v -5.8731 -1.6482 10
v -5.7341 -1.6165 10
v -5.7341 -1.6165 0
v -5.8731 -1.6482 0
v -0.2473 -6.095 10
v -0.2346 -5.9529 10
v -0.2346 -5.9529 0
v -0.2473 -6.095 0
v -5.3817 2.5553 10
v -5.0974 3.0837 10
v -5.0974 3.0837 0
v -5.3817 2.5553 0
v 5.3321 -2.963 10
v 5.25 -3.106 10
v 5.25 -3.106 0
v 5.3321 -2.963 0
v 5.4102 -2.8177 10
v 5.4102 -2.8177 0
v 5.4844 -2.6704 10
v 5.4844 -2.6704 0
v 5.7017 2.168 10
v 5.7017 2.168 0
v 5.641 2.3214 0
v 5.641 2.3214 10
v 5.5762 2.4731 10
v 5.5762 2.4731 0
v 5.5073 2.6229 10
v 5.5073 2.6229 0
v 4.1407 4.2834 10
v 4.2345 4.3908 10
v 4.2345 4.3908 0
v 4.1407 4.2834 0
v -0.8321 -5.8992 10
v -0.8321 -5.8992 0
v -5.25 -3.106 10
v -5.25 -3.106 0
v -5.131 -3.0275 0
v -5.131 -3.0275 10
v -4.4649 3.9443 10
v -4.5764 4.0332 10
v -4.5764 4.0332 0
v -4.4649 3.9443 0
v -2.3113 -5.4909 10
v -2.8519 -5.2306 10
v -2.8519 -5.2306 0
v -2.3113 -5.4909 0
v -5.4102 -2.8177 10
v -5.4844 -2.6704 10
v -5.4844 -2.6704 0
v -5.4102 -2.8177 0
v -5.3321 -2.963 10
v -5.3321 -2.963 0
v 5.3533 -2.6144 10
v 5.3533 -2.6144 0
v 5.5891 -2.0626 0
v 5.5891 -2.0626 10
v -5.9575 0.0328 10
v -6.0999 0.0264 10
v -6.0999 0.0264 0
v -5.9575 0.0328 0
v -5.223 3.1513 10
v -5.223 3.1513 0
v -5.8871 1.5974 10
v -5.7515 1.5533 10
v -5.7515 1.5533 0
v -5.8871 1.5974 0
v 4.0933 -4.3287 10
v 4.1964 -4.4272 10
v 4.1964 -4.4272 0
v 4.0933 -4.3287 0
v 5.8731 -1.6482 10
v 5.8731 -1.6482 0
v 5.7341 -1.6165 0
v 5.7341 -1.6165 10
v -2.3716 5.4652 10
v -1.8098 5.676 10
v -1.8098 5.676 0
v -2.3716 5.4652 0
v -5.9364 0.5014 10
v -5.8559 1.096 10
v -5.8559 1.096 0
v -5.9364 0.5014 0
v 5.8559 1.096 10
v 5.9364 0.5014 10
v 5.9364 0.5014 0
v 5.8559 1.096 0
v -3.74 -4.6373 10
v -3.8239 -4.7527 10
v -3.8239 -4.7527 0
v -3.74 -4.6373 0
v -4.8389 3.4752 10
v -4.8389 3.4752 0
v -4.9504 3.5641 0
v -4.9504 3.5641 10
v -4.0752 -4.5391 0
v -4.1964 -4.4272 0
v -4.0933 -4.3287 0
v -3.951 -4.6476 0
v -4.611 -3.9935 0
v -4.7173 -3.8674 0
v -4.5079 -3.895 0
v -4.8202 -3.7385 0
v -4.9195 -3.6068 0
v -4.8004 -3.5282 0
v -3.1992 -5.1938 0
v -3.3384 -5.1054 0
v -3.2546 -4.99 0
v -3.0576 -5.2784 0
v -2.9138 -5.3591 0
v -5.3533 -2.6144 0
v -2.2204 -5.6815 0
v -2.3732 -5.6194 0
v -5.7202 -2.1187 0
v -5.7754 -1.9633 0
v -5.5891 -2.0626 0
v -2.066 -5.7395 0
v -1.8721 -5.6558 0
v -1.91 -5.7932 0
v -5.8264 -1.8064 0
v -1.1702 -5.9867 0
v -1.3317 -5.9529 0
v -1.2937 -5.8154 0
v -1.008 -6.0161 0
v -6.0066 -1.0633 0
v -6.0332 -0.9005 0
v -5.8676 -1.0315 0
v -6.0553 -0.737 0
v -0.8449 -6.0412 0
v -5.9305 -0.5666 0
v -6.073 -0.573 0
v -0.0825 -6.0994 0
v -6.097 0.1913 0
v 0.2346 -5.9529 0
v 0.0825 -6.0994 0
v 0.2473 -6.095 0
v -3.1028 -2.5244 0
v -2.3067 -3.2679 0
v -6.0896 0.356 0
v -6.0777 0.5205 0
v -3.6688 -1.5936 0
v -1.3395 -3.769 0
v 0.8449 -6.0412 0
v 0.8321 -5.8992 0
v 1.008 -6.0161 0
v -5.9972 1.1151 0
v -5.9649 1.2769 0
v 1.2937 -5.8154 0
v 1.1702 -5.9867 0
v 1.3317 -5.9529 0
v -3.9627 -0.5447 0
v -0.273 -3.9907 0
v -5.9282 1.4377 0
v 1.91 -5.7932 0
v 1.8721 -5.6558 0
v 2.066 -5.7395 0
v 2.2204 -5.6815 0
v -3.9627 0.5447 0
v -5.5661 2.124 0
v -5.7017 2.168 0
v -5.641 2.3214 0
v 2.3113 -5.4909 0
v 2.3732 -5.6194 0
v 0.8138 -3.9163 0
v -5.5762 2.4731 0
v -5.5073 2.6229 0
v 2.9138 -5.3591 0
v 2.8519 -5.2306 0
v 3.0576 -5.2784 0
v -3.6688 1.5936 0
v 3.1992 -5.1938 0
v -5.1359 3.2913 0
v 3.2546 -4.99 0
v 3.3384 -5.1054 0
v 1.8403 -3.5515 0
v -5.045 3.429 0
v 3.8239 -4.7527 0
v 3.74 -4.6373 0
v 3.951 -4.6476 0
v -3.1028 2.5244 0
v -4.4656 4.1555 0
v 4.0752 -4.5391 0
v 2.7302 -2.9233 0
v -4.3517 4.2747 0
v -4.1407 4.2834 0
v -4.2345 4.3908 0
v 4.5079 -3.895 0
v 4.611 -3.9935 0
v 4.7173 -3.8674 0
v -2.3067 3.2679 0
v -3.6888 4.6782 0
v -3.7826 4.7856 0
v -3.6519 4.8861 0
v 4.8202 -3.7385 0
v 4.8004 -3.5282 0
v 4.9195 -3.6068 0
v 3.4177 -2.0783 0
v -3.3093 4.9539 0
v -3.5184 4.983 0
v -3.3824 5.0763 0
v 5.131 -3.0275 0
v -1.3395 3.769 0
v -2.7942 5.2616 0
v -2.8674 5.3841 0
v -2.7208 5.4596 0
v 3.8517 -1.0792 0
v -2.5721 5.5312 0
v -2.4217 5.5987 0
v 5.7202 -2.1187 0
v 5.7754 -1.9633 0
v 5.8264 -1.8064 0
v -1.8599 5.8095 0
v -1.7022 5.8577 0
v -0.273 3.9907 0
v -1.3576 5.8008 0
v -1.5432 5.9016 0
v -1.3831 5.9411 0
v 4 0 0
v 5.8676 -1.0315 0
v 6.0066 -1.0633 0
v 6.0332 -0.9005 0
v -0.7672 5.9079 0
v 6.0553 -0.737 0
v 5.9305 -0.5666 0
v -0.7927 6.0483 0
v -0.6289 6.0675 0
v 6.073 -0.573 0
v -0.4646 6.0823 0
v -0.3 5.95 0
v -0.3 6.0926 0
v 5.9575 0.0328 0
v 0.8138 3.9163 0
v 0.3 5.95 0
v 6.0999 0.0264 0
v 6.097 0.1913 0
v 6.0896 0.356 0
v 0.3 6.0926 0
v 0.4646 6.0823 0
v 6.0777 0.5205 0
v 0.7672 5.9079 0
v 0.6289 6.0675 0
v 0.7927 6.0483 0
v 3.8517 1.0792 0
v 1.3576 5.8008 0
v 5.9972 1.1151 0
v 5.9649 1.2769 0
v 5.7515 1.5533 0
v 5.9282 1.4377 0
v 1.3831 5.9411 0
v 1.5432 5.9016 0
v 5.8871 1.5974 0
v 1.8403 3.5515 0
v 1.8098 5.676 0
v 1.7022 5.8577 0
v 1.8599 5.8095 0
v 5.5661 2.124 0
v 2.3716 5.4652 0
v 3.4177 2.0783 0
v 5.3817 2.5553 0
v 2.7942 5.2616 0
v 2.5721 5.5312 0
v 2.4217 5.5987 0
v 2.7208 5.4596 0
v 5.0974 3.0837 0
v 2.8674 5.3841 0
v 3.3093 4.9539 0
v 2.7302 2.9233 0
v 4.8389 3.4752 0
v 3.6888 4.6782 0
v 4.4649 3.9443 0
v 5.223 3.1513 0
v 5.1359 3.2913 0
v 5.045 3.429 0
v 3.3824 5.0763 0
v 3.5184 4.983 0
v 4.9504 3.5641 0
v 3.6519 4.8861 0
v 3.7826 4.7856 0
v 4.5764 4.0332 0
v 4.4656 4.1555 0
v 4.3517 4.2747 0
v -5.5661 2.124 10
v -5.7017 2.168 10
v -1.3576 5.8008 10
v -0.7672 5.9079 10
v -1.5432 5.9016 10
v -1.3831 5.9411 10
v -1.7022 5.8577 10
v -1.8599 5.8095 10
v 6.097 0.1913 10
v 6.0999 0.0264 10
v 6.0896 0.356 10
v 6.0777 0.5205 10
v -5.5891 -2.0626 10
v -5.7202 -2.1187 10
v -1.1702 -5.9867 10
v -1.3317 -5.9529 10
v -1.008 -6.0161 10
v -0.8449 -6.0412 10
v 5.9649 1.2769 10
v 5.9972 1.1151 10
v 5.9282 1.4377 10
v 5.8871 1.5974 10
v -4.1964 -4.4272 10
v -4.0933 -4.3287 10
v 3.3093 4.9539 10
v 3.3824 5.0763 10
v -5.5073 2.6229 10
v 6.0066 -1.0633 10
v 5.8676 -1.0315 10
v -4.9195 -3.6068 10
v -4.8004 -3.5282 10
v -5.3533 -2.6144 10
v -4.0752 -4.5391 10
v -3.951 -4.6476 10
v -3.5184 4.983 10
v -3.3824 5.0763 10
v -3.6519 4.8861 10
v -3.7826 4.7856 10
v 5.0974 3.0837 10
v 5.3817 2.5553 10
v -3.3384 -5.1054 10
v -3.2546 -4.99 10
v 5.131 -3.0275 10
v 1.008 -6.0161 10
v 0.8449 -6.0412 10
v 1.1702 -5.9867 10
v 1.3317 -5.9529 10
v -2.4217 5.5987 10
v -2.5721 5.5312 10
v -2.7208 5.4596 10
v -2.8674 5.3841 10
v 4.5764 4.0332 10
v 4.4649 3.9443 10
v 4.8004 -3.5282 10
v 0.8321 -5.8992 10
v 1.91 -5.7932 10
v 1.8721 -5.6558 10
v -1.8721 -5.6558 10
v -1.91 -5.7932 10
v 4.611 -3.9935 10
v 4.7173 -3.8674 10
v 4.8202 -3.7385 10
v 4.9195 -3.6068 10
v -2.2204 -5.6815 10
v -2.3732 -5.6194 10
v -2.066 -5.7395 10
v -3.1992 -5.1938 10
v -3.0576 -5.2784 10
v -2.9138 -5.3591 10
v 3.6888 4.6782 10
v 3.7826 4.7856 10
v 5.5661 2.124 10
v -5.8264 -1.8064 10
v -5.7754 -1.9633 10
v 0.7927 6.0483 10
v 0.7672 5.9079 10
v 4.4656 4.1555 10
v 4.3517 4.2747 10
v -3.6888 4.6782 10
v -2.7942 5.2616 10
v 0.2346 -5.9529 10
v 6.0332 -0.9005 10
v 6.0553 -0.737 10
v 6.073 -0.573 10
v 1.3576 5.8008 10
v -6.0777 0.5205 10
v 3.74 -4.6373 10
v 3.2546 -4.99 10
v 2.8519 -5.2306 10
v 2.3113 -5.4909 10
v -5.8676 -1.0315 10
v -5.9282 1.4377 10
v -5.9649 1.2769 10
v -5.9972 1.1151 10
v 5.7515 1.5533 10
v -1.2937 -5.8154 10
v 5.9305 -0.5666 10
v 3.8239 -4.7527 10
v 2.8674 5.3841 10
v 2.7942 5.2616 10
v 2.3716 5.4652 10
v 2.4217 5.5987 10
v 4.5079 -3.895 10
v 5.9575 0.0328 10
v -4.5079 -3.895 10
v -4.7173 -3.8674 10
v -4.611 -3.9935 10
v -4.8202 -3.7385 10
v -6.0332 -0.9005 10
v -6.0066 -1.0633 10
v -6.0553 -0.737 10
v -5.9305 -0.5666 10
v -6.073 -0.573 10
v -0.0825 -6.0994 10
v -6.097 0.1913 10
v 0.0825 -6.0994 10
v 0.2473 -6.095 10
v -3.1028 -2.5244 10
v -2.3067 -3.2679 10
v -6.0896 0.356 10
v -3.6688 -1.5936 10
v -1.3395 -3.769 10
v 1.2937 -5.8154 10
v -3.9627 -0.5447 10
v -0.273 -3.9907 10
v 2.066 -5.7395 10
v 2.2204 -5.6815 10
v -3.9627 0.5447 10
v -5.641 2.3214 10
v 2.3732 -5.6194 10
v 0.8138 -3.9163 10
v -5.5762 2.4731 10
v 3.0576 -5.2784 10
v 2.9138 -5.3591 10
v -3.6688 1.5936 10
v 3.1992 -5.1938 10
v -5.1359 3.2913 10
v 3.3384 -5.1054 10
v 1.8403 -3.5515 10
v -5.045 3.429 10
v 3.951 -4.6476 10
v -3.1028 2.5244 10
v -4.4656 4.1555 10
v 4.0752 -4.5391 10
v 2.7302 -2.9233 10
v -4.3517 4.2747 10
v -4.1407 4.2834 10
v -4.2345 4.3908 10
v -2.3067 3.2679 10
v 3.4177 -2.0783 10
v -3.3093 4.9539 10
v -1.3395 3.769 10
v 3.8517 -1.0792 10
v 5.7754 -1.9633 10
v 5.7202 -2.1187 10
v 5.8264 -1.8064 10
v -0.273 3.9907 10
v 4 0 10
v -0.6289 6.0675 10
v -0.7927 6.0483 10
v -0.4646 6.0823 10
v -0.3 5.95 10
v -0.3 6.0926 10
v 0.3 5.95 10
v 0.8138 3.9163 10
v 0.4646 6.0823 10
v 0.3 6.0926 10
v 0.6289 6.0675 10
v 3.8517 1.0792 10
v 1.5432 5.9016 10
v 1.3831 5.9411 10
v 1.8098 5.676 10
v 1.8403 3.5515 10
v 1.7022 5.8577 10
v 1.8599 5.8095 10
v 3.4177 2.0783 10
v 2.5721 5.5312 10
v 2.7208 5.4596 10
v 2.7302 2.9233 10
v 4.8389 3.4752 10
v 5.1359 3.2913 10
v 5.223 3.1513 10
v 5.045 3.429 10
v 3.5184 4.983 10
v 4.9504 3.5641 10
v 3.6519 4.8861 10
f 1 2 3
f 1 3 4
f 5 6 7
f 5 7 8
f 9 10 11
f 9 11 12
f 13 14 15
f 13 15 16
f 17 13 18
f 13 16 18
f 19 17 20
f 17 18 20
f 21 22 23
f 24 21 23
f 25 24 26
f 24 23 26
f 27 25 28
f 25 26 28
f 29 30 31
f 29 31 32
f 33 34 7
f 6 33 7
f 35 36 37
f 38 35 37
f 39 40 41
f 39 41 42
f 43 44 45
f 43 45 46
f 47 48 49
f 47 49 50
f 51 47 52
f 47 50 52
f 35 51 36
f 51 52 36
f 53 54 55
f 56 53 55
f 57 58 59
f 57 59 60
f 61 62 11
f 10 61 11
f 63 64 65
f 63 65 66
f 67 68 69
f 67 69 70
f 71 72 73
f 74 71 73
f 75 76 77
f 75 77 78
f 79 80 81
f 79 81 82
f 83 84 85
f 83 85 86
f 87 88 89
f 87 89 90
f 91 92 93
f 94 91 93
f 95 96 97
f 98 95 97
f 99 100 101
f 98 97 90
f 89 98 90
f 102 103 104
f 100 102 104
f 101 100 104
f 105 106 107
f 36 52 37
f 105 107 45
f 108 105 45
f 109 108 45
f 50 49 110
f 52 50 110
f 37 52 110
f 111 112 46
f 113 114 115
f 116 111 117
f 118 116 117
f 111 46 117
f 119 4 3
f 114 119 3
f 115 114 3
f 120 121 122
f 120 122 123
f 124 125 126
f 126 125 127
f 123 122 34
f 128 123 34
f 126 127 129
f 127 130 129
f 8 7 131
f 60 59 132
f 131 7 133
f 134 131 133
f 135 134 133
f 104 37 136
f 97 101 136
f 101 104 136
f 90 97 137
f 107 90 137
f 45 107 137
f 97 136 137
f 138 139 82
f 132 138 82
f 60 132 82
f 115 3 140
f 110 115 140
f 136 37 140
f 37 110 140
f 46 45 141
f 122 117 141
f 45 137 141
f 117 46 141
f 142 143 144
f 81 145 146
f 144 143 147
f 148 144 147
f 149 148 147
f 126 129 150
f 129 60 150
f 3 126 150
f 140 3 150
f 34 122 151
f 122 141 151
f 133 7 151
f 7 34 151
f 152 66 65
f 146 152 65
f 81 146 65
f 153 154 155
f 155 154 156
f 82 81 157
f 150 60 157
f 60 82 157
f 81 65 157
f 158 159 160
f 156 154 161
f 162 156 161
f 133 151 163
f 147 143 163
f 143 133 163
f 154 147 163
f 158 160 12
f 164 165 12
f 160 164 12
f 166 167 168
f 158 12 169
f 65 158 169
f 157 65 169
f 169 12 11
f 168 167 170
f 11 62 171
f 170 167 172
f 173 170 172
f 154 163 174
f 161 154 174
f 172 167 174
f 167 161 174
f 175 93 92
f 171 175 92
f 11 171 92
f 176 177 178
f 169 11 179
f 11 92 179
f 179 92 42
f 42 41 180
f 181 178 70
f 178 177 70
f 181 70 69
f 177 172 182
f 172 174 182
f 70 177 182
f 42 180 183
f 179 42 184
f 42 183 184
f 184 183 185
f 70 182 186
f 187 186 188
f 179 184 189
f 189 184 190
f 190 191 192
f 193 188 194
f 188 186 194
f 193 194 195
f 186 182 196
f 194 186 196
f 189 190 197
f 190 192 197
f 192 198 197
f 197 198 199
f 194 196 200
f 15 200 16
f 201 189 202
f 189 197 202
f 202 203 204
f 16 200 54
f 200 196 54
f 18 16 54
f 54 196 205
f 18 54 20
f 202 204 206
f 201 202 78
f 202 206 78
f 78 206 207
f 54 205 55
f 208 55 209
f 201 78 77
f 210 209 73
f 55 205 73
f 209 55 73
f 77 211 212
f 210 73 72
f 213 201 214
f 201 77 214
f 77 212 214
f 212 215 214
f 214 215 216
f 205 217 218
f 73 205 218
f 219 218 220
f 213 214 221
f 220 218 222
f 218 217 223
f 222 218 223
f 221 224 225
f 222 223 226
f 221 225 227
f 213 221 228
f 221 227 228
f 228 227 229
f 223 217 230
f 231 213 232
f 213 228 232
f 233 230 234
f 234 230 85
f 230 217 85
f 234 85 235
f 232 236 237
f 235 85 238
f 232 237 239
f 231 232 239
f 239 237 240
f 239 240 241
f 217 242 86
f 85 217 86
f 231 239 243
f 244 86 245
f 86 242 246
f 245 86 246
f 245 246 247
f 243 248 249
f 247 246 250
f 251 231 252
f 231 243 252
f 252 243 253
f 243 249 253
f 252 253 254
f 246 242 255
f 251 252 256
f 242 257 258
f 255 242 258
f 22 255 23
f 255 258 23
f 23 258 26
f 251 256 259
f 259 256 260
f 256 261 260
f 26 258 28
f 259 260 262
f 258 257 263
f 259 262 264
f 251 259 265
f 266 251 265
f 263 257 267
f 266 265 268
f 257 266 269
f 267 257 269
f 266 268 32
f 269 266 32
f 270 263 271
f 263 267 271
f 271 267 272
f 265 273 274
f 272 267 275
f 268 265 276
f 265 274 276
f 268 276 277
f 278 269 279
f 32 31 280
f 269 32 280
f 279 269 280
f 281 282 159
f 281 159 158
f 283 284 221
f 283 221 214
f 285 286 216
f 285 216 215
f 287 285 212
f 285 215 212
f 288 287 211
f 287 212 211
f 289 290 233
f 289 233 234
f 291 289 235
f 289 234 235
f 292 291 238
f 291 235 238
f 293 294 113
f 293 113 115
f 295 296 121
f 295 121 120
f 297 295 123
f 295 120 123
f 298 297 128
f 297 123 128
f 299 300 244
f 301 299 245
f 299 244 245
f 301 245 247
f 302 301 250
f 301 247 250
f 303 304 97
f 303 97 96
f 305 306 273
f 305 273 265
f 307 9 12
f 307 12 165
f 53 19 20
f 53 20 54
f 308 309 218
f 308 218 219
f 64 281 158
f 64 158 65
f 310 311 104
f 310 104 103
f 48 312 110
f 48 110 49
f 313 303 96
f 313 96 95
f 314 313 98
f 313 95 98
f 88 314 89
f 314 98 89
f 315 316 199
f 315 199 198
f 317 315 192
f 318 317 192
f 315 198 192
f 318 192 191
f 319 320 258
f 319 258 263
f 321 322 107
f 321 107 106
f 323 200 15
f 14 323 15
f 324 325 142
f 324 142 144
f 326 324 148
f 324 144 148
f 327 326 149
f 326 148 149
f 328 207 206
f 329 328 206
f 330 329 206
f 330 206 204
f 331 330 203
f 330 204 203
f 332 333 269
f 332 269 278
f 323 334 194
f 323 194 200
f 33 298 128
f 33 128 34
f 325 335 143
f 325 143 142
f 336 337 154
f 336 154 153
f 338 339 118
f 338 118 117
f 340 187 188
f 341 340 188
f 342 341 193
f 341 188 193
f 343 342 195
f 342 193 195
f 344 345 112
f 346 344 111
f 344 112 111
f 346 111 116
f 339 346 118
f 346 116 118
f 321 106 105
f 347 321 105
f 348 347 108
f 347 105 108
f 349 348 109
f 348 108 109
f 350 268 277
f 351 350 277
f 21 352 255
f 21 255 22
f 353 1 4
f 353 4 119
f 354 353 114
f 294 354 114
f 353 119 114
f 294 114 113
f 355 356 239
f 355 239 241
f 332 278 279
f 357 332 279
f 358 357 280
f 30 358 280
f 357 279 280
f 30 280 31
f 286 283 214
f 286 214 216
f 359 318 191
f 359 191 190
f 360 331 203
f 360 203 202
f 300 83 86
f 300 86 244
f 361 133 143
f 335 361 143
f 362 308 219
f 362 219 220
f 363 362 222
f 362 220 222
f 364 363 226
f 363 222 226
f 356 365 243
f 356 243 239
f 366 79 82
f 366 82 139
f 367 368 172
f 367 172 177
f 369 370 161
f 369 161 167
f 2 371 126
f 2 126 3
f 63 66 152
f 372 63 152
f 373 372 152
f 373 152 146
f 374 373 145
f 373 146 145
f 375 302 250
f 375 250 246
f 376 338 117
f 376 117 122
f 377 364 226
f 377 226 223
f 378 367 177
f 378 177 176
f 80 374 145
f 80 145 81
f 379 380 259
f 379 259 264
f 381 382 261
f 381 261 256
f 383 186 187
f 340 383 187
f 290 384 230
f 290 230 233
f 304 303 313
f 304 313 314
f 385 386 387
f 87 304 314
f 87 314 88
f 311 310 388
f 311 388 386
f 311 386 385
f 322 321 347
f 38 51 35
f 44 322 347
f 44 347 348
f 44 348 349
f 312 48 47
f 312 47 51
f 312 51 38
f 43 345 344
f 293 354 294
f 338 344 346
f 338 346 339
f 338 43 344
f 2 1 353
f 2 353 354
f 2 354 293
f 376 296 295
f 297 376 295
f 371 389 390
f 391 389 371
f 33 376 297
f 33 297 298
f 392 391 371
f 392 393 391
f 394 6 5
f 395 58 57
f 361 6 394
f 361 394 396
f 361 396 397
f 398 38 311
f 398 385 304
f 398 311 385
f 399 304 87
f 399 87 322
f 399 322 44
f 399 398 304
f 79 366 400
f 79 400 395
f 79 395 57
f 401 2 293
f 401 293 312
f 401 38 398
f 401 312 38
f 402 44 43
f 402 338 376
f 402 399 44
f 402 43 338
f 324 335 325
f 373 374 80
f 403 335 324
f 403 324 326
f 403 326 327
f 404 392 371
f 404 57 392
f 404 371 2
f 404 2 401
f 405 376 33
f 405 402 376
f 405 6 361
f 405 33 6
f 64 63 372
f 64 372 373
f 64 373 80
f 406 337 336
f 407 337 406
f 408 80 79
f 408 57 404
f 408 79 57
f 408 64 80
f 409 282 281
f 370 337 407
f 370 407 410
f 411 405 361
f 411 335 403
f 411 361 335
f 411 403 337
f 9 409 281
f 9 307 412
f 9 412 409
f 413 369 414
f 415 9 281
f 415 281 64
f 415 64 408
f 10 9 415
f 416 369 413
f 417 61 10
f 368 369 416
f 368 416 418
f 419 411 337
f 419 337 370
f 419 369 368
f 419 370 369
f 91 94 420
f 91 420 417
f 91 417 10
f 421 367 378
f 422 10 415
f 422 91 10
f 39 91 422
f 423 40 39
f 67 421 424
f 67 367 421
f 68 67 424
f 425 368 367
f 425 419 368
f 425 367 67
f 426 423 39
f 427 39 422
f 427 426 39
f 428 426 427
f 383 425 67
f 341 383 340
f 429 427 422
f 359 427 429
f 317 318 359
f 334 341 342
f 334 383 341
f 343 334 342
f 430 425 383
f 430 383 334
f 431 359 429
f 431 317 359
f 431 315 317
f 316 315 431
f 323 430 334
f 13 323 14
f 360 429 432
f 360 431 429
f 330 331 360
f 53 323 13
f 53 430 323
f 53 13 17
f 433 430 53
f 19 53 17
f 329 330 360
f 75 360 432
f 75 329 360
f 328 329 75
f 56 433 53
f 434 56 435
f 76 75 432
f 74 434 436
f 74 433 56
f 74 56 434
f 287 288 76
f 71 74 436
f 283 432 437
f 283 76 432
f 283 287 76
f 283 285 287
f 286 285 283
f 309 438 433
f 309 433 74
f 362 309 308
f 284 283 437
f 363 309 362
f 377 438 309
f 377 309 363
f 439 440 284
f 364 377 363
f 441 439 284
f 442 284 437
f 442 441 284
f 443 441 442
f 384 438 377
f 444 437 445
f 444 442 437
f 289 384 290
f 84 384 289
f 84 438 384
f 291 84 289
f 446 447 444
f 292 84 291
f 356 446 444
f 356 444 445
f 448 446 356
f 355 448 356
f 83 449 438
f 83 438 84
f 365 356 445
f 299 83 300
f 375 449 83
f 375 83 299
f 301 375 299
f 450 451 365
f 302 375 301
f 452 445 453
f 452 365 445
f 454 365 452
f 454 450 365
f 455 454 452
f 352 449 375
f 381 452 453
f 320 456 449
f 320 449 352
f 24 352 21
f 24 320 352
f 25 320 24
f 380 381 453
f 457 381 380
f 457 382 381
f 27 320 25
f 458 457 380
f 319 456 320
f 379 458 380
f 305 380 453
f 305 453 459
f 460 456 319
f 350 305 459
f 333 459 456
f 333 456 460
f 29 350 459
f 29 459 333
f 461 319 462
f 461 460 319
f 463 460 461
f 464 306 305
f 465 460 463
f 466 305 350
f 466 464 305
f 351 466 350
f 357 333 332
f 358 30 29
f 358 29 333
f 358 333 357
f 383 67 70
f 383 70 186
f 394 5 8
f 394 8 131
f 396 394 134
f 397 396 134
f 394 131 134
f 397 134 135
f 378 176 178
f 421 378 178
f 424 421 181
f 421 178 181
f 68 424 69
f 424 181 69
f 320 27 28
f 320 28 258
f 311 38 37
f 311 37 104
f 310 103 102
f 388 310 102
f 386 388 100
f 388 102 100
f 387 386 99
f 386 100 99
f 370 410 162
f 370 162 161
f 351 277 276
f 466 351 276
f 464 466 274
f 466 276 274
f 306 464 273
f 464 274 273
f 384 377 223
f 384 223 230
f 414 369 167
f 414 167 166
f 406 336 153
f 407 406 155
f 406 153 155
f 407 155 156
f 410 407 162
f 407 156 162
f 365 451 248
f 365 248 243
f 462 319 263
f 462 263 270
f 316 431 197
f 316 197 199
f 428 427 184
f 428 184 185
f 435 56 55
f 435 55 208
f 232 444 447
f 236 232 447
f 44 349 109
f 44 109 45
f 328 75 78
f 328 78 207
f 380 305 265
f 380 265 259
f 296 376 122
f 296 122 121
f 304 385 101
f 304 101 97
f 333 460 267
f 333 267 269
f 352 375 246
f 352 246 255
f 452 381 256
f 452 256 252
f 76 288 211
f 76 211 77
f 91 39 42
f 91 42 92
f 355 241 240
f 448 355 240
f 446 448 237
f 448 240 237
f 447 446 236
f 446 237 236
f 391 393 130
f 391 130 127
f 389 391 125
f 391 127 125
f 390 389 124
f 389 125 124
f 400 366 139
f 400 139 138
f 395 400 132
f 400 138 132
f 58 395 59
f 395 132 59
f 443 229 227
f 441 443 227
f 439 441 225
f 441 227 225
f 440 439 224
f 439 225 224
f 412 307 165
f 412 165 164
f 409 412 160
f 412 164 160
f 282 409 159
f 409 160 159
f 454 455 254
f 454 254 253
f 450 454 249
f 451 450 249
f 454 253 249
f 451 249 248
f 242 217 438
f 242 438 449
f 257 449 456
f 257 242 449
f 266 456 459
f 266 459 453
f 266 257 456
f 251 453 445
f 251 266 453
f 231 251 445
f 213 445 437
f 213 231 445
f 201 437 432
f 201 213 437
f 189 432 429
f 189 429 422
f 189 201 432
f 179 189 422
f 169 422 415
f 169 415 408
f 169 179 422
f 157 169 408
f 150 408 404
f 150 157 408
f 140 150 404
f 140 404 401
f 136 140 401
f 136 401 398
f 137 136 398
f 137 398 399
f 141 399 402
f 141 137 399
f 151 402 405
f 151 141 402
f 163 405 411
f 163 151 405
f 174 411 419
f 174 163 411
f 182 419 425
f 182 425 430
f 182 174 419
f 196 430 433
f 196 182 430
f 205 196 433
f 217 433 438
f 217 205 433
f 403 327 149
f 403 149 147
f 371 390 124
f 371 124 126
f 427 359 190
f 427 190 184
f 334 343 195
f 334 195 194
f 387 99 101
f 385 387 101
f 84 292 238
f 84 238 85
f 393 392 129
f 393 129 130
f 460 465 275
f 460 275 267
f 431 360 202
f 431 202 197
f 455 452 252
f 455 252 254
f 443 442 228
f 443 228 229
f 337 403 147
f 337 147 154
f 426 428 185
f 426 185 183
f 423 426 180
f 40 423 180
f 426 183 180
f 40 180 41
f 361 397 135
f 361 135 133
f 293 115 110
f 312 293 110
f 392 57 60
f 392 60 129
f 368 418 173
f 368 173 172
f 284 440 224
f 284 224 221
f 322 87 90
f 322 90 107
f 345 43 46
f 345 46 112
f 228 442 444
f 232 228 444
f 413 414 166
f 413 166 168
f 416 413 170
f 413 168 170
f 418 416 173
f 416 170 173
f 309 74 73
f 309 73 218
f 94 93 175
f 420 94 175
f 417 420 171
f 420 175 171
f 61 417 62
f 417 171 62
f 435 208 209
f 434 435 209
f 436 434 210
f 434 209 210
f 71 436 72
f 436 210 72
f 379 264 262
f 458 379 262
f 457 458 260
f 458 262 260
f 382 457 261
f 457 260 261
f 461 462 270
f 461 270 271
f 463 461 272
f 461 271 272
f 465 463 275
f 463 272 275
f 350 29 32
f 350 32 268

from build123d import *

# Parameters (mm, degrees)
ESQUISSE1_R             = 6.1
ESQUISSE1_R_2           = 4
BOSS_EXTRU_1_DEPTH      = 10
ESQUISSE4_W             = 0.6
ESQUISSE4_H             = 0.3
ENL_V_MAT_EXTRU_3_DEPTH = 10


with BuildPart() as part:
    # Esquisse1 → Boss.-Extru.1 (new body)
    with BuildSketch(Plane.XY):
        Circle(ESQUISSE1_R)
        Circle(ESQUISSE1_R_2, mode=Mode.SUBTRACT)
    extrude(amount=BOSS_EXTRU_1_DEPTH)

    # Esquisse4 → Enlèv. mat.-Extru.3 (cut)
    with BuildSketch(Plane.XY.offset(10)):
        Polygon((0.767234647, 5.907948121), (0.820801716, 6.203126997), (1.411159469, 6.09599286), (1.357592401, 5.800813984), align=None)
        with Locations((0, 6.1)):
            Rectangle(ESQUISSE4_W, ESQUISSE4_H)
        Polygon((1.809809742, 5.676009928), (1.915222189, 5.956880389), (2.476963112, 5.746055494), (2.371550664, 5.465185033), align=None)
        Polygon((2.794216062, 5.261640105), (2.948085846, 5.519174743), (3.463155122, 5.211435177), (3.309285339, 4.953900539), align=None)
        Polygon((3.68881398, 4.678156841), (3.886195597, 4.90407828), (4.338038477, 4.509315045), (4.140656859, 4.283393605), align=None)
        Polygon((4.46485038, 3.944313766), (4.699399825, 4.131360706), (5.073493706, 3.662261817), (4.838944261, 3.475214876), align=None)
        Polygon((5.097382816, 3.083697201), (5.361561475, 3.2258578), (5.645882673, 2.697500481), (5.381704013, 2.555339882), align=None)
        Polygon((5.566081174, 2.123968071), (5.851398129, 2.21667317), (6.036808325, 1.64603926), (5.75149137, 1.553334162), align=None)
        Polygon((5.855881103, 1.09597286), (6.153166031, 1.13624284), (6.233705991, 0.541672983), (5.936421062, 0.501403003), align=None)
        Polygon((5.957468195, 0.032752179), (6.257166115, 0.01929273), (6.230247217, -0.58010311), (5.930549297, -0.566643661), align=None)
        Polygon((5.867577358, -1.031521183), (6.160055731, -1.098277464), (6.026543171, -1.683234211), (5.734064797, -1.616477931), align=None)
        Polygon((5.589097756, -2.062640607), (5.864956088, -2.180548116), (5.629141069, -2.73226478), (5.353282737, -2.61435727), align=None)
        Polygon((5.130979954, -3.027465064), (5.38135193, -3.192734158), (5.050813741, -3.69347811), (4.800441765, -3.528209016), align=None)
        Polygon((4.507948234, -3.894984302), (4.724786694, -4.102303097), (4.310149104, -4.535980015), (4.093310645, -4.328661221), align=None)
        Polygon((3.740027349, -4.637315541), (3.916362925, -4.880020639), (3.430952729, -5.232691791), (3.254617153, -4.989986692), align=None)
        Polygon((2.851898908, -5.230599642), (2.98206403, -5.500890303), (2.441482709, -5.761220546), (2.311317587, -5.490929886), align=None)
        Polygon((1.872108089, -5.655767967), (1.951919143, -5.944956826), (1.373541427, -6.104578933), (1.293730373, -5.815390075), align=None)
        Polygon((0.832146176, -5.899155257), (0.859037969, -6.197947545), (0.261453392, -6.25173113), (0.2345616, -5.952938842), align=None)
        Polygon((-0.2345616, -5.952938842), (-0.261453392, -6.25173113), (-0.859037969, -6.197947545), (-0.832146176, -5.899155257), align=None)
        Polygon((-1.293730373, -5.815390075), (-1.373541427, -6.104578933), (-1.951919143, -5.944956826), (-1.872108089, -5.655767967), align=None)
        Polygon((-2.311317587, -5.490929886), (-2.441482709, -5.761220546), (-2.98206403, -5.500890303), (-2.851898908, -5.230599642), align=None)
        Polygon((-3.254617153, -4.989986692), (-3.430952729, -5.232691791), (-3.916362925, -4.880020639), (-3.740027349, -4.637315541), align=None)
        Polygon((-4.093310645, -4.328661221), (-4.310149104, -4.535980015), (-4.724786694, -4.102303097), (-4.507948234, -3.894984302), align=None)
        Polygon((-4.800441765, -3.528209016), (-5.050813741, -3.69347811), (-5.38135193, -3.192734158), (-5.130979954, -3.027465064), align=None)
        Polygon((-5.353282737, -2.61435727), (-5.629141069, -2.73226478), (-5.864956088, -2.180548116), (-5.589097756, -2.062640607), align=None)
        Polygon((-5.734064797, -1.616477931), (-6.026543171, -1.683234211), (-6.160055731, -1.098277464), (-5.867577358, -1.031521183), align=None)
        Polygon((-5.930549297, -0.566643661), (-6.230247217, -0.58010311), (-6.257166115, 0.01929273), (-5.957468195, 0.032752179), align=None)
        Polygon((-5.936421062, 0.501403003), (-6.233705991, 0.541672983), (-6.153166031, 1.13624284), (-5.855881103, 1.09597286), align=None)
        Polygon((-5.75149137, 1.553334162), (-6.036808325, 1.64603926), (-5.851398129, 2.21667317), (-5.566081174, 2.123968071), align=None)
        Polygon((-5.381704013, 2.555339882), (-5.645882673, 2.697500481), (-5.361561475, 3.2258578), (-5.097382816, 3.083697201), align=None)
        Polygon((-4.838944261, 3.475214876), (-5.073493706, 3.662261817), (-4.699399825, 4.131360706), (-4.46485038, 3.944313766), align=None)
        Polygon((-4.140656859, 4.283393605), (-4.338038477, 4.509315045), (-3.886195597, 4.90407828), (-3.68881398, 4.678156841), align=None)
        Polygon((-3.309285339, 4.953900539), (-3.463155122, 5.211435177), (-2.948085846, 5.519174743), (-2.794216062, 5.261640105), align=None)
        Polygon((-2.371550664, 5.465185033), (-2.476963112, 5.746055494), (-1.915222189, 5.956880389), (-1.809809742, 5.676009928), align=None)
        Polygon((-1.357592401, 5.800813984), (-1.411159469, 6.09599286), (-0.820801716, 6.203126997), (-0.767234647, 5.907948121), align=None)
    extrude(amount=-ENL_V_MAT_EXTRU_3_DEPTH, mode=Mode.SUBTRACT)


solid = part.part
